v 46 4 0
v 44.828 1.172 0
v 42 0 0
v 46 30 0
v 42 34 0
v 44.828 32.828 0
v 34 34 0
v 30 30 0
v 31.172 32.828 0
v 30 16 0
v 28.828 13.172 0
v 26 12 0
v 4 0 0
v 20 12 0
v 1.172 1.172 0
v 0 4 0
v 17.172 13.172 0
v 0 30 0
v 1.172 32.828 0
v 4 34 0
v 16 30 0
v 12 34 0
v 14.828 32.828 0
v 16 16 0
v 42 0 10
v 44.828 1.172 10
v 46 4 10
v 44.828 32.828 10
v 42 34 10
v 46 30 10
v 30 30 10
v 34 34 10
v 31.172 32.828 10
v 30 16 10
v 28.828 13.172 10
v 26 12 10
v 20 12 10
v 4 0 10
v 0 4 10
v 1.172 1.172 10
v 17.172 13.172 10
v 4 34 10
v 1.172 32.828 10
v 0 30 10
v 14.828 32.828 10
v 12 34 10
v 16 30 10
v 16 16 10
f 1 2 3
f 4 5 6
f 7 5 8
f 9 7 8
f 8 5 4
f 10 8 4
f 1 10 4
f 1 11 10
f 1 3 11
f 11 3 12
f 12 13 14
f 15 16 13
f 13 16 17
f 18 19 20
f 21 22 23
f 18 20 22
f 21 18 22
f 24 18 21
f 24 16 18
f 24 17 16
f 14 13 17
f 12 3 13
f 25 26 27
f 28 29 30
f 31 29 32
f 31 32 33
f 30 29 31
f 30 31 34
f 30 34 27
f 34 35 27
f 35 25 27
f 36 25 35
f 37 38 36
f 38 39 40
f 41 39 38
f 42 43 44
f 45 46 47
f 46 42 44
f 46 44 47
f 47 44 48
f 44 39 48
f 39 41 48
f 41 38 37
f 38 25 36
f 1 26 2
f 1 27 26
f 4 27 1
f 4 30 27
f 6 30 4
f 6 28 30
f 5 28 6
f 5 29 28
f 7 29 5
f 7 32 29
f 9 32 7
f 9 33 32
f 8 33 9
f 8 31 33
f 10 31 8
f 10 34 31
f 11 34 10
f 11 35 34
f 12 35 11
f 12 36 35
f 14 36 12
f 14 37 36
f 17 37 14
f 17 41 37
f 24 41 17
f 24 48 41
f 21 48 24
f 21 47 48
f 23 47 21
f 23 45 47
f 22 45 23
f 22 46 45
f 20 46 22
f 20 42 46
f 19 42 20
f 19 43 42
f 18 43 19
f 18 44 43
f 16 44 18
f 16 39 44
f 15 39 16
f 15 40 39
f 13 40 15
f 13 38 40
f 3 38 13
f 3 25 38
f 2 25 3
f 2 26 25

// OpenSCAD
$fn = 32;

// ----------------------------------------------------------------------
// Eye lug: clevis, 10 mm thick
// ----------------------------------------------------------------------

// --- parameters (mm) ---
profile_height = 10;      // extrusion height
profile_points = 24;      // points of the closed outline

profile = [[0, 4], [1.172, 1.172], [4, 0], [42, 0], [44.828, 1.172], [46, 4], [46, 30], [44.828, 32.828], [42, 34], [34, 34], [31.172, 32.828], [30, 30], [30, 16], [28.828, 13.172], [26, 12], [20, 12], [17.172, 13.172], [16, 16], [16, 30], [14.828, 32.828], [12, 34], [4, 34], [1.172, 32.828], [0, 30]];  // single closed polygon, 24 points, counter clockwise

// --- the one profile operation ---
linear_extrude(height = profile_height) polygon(points = profile);
